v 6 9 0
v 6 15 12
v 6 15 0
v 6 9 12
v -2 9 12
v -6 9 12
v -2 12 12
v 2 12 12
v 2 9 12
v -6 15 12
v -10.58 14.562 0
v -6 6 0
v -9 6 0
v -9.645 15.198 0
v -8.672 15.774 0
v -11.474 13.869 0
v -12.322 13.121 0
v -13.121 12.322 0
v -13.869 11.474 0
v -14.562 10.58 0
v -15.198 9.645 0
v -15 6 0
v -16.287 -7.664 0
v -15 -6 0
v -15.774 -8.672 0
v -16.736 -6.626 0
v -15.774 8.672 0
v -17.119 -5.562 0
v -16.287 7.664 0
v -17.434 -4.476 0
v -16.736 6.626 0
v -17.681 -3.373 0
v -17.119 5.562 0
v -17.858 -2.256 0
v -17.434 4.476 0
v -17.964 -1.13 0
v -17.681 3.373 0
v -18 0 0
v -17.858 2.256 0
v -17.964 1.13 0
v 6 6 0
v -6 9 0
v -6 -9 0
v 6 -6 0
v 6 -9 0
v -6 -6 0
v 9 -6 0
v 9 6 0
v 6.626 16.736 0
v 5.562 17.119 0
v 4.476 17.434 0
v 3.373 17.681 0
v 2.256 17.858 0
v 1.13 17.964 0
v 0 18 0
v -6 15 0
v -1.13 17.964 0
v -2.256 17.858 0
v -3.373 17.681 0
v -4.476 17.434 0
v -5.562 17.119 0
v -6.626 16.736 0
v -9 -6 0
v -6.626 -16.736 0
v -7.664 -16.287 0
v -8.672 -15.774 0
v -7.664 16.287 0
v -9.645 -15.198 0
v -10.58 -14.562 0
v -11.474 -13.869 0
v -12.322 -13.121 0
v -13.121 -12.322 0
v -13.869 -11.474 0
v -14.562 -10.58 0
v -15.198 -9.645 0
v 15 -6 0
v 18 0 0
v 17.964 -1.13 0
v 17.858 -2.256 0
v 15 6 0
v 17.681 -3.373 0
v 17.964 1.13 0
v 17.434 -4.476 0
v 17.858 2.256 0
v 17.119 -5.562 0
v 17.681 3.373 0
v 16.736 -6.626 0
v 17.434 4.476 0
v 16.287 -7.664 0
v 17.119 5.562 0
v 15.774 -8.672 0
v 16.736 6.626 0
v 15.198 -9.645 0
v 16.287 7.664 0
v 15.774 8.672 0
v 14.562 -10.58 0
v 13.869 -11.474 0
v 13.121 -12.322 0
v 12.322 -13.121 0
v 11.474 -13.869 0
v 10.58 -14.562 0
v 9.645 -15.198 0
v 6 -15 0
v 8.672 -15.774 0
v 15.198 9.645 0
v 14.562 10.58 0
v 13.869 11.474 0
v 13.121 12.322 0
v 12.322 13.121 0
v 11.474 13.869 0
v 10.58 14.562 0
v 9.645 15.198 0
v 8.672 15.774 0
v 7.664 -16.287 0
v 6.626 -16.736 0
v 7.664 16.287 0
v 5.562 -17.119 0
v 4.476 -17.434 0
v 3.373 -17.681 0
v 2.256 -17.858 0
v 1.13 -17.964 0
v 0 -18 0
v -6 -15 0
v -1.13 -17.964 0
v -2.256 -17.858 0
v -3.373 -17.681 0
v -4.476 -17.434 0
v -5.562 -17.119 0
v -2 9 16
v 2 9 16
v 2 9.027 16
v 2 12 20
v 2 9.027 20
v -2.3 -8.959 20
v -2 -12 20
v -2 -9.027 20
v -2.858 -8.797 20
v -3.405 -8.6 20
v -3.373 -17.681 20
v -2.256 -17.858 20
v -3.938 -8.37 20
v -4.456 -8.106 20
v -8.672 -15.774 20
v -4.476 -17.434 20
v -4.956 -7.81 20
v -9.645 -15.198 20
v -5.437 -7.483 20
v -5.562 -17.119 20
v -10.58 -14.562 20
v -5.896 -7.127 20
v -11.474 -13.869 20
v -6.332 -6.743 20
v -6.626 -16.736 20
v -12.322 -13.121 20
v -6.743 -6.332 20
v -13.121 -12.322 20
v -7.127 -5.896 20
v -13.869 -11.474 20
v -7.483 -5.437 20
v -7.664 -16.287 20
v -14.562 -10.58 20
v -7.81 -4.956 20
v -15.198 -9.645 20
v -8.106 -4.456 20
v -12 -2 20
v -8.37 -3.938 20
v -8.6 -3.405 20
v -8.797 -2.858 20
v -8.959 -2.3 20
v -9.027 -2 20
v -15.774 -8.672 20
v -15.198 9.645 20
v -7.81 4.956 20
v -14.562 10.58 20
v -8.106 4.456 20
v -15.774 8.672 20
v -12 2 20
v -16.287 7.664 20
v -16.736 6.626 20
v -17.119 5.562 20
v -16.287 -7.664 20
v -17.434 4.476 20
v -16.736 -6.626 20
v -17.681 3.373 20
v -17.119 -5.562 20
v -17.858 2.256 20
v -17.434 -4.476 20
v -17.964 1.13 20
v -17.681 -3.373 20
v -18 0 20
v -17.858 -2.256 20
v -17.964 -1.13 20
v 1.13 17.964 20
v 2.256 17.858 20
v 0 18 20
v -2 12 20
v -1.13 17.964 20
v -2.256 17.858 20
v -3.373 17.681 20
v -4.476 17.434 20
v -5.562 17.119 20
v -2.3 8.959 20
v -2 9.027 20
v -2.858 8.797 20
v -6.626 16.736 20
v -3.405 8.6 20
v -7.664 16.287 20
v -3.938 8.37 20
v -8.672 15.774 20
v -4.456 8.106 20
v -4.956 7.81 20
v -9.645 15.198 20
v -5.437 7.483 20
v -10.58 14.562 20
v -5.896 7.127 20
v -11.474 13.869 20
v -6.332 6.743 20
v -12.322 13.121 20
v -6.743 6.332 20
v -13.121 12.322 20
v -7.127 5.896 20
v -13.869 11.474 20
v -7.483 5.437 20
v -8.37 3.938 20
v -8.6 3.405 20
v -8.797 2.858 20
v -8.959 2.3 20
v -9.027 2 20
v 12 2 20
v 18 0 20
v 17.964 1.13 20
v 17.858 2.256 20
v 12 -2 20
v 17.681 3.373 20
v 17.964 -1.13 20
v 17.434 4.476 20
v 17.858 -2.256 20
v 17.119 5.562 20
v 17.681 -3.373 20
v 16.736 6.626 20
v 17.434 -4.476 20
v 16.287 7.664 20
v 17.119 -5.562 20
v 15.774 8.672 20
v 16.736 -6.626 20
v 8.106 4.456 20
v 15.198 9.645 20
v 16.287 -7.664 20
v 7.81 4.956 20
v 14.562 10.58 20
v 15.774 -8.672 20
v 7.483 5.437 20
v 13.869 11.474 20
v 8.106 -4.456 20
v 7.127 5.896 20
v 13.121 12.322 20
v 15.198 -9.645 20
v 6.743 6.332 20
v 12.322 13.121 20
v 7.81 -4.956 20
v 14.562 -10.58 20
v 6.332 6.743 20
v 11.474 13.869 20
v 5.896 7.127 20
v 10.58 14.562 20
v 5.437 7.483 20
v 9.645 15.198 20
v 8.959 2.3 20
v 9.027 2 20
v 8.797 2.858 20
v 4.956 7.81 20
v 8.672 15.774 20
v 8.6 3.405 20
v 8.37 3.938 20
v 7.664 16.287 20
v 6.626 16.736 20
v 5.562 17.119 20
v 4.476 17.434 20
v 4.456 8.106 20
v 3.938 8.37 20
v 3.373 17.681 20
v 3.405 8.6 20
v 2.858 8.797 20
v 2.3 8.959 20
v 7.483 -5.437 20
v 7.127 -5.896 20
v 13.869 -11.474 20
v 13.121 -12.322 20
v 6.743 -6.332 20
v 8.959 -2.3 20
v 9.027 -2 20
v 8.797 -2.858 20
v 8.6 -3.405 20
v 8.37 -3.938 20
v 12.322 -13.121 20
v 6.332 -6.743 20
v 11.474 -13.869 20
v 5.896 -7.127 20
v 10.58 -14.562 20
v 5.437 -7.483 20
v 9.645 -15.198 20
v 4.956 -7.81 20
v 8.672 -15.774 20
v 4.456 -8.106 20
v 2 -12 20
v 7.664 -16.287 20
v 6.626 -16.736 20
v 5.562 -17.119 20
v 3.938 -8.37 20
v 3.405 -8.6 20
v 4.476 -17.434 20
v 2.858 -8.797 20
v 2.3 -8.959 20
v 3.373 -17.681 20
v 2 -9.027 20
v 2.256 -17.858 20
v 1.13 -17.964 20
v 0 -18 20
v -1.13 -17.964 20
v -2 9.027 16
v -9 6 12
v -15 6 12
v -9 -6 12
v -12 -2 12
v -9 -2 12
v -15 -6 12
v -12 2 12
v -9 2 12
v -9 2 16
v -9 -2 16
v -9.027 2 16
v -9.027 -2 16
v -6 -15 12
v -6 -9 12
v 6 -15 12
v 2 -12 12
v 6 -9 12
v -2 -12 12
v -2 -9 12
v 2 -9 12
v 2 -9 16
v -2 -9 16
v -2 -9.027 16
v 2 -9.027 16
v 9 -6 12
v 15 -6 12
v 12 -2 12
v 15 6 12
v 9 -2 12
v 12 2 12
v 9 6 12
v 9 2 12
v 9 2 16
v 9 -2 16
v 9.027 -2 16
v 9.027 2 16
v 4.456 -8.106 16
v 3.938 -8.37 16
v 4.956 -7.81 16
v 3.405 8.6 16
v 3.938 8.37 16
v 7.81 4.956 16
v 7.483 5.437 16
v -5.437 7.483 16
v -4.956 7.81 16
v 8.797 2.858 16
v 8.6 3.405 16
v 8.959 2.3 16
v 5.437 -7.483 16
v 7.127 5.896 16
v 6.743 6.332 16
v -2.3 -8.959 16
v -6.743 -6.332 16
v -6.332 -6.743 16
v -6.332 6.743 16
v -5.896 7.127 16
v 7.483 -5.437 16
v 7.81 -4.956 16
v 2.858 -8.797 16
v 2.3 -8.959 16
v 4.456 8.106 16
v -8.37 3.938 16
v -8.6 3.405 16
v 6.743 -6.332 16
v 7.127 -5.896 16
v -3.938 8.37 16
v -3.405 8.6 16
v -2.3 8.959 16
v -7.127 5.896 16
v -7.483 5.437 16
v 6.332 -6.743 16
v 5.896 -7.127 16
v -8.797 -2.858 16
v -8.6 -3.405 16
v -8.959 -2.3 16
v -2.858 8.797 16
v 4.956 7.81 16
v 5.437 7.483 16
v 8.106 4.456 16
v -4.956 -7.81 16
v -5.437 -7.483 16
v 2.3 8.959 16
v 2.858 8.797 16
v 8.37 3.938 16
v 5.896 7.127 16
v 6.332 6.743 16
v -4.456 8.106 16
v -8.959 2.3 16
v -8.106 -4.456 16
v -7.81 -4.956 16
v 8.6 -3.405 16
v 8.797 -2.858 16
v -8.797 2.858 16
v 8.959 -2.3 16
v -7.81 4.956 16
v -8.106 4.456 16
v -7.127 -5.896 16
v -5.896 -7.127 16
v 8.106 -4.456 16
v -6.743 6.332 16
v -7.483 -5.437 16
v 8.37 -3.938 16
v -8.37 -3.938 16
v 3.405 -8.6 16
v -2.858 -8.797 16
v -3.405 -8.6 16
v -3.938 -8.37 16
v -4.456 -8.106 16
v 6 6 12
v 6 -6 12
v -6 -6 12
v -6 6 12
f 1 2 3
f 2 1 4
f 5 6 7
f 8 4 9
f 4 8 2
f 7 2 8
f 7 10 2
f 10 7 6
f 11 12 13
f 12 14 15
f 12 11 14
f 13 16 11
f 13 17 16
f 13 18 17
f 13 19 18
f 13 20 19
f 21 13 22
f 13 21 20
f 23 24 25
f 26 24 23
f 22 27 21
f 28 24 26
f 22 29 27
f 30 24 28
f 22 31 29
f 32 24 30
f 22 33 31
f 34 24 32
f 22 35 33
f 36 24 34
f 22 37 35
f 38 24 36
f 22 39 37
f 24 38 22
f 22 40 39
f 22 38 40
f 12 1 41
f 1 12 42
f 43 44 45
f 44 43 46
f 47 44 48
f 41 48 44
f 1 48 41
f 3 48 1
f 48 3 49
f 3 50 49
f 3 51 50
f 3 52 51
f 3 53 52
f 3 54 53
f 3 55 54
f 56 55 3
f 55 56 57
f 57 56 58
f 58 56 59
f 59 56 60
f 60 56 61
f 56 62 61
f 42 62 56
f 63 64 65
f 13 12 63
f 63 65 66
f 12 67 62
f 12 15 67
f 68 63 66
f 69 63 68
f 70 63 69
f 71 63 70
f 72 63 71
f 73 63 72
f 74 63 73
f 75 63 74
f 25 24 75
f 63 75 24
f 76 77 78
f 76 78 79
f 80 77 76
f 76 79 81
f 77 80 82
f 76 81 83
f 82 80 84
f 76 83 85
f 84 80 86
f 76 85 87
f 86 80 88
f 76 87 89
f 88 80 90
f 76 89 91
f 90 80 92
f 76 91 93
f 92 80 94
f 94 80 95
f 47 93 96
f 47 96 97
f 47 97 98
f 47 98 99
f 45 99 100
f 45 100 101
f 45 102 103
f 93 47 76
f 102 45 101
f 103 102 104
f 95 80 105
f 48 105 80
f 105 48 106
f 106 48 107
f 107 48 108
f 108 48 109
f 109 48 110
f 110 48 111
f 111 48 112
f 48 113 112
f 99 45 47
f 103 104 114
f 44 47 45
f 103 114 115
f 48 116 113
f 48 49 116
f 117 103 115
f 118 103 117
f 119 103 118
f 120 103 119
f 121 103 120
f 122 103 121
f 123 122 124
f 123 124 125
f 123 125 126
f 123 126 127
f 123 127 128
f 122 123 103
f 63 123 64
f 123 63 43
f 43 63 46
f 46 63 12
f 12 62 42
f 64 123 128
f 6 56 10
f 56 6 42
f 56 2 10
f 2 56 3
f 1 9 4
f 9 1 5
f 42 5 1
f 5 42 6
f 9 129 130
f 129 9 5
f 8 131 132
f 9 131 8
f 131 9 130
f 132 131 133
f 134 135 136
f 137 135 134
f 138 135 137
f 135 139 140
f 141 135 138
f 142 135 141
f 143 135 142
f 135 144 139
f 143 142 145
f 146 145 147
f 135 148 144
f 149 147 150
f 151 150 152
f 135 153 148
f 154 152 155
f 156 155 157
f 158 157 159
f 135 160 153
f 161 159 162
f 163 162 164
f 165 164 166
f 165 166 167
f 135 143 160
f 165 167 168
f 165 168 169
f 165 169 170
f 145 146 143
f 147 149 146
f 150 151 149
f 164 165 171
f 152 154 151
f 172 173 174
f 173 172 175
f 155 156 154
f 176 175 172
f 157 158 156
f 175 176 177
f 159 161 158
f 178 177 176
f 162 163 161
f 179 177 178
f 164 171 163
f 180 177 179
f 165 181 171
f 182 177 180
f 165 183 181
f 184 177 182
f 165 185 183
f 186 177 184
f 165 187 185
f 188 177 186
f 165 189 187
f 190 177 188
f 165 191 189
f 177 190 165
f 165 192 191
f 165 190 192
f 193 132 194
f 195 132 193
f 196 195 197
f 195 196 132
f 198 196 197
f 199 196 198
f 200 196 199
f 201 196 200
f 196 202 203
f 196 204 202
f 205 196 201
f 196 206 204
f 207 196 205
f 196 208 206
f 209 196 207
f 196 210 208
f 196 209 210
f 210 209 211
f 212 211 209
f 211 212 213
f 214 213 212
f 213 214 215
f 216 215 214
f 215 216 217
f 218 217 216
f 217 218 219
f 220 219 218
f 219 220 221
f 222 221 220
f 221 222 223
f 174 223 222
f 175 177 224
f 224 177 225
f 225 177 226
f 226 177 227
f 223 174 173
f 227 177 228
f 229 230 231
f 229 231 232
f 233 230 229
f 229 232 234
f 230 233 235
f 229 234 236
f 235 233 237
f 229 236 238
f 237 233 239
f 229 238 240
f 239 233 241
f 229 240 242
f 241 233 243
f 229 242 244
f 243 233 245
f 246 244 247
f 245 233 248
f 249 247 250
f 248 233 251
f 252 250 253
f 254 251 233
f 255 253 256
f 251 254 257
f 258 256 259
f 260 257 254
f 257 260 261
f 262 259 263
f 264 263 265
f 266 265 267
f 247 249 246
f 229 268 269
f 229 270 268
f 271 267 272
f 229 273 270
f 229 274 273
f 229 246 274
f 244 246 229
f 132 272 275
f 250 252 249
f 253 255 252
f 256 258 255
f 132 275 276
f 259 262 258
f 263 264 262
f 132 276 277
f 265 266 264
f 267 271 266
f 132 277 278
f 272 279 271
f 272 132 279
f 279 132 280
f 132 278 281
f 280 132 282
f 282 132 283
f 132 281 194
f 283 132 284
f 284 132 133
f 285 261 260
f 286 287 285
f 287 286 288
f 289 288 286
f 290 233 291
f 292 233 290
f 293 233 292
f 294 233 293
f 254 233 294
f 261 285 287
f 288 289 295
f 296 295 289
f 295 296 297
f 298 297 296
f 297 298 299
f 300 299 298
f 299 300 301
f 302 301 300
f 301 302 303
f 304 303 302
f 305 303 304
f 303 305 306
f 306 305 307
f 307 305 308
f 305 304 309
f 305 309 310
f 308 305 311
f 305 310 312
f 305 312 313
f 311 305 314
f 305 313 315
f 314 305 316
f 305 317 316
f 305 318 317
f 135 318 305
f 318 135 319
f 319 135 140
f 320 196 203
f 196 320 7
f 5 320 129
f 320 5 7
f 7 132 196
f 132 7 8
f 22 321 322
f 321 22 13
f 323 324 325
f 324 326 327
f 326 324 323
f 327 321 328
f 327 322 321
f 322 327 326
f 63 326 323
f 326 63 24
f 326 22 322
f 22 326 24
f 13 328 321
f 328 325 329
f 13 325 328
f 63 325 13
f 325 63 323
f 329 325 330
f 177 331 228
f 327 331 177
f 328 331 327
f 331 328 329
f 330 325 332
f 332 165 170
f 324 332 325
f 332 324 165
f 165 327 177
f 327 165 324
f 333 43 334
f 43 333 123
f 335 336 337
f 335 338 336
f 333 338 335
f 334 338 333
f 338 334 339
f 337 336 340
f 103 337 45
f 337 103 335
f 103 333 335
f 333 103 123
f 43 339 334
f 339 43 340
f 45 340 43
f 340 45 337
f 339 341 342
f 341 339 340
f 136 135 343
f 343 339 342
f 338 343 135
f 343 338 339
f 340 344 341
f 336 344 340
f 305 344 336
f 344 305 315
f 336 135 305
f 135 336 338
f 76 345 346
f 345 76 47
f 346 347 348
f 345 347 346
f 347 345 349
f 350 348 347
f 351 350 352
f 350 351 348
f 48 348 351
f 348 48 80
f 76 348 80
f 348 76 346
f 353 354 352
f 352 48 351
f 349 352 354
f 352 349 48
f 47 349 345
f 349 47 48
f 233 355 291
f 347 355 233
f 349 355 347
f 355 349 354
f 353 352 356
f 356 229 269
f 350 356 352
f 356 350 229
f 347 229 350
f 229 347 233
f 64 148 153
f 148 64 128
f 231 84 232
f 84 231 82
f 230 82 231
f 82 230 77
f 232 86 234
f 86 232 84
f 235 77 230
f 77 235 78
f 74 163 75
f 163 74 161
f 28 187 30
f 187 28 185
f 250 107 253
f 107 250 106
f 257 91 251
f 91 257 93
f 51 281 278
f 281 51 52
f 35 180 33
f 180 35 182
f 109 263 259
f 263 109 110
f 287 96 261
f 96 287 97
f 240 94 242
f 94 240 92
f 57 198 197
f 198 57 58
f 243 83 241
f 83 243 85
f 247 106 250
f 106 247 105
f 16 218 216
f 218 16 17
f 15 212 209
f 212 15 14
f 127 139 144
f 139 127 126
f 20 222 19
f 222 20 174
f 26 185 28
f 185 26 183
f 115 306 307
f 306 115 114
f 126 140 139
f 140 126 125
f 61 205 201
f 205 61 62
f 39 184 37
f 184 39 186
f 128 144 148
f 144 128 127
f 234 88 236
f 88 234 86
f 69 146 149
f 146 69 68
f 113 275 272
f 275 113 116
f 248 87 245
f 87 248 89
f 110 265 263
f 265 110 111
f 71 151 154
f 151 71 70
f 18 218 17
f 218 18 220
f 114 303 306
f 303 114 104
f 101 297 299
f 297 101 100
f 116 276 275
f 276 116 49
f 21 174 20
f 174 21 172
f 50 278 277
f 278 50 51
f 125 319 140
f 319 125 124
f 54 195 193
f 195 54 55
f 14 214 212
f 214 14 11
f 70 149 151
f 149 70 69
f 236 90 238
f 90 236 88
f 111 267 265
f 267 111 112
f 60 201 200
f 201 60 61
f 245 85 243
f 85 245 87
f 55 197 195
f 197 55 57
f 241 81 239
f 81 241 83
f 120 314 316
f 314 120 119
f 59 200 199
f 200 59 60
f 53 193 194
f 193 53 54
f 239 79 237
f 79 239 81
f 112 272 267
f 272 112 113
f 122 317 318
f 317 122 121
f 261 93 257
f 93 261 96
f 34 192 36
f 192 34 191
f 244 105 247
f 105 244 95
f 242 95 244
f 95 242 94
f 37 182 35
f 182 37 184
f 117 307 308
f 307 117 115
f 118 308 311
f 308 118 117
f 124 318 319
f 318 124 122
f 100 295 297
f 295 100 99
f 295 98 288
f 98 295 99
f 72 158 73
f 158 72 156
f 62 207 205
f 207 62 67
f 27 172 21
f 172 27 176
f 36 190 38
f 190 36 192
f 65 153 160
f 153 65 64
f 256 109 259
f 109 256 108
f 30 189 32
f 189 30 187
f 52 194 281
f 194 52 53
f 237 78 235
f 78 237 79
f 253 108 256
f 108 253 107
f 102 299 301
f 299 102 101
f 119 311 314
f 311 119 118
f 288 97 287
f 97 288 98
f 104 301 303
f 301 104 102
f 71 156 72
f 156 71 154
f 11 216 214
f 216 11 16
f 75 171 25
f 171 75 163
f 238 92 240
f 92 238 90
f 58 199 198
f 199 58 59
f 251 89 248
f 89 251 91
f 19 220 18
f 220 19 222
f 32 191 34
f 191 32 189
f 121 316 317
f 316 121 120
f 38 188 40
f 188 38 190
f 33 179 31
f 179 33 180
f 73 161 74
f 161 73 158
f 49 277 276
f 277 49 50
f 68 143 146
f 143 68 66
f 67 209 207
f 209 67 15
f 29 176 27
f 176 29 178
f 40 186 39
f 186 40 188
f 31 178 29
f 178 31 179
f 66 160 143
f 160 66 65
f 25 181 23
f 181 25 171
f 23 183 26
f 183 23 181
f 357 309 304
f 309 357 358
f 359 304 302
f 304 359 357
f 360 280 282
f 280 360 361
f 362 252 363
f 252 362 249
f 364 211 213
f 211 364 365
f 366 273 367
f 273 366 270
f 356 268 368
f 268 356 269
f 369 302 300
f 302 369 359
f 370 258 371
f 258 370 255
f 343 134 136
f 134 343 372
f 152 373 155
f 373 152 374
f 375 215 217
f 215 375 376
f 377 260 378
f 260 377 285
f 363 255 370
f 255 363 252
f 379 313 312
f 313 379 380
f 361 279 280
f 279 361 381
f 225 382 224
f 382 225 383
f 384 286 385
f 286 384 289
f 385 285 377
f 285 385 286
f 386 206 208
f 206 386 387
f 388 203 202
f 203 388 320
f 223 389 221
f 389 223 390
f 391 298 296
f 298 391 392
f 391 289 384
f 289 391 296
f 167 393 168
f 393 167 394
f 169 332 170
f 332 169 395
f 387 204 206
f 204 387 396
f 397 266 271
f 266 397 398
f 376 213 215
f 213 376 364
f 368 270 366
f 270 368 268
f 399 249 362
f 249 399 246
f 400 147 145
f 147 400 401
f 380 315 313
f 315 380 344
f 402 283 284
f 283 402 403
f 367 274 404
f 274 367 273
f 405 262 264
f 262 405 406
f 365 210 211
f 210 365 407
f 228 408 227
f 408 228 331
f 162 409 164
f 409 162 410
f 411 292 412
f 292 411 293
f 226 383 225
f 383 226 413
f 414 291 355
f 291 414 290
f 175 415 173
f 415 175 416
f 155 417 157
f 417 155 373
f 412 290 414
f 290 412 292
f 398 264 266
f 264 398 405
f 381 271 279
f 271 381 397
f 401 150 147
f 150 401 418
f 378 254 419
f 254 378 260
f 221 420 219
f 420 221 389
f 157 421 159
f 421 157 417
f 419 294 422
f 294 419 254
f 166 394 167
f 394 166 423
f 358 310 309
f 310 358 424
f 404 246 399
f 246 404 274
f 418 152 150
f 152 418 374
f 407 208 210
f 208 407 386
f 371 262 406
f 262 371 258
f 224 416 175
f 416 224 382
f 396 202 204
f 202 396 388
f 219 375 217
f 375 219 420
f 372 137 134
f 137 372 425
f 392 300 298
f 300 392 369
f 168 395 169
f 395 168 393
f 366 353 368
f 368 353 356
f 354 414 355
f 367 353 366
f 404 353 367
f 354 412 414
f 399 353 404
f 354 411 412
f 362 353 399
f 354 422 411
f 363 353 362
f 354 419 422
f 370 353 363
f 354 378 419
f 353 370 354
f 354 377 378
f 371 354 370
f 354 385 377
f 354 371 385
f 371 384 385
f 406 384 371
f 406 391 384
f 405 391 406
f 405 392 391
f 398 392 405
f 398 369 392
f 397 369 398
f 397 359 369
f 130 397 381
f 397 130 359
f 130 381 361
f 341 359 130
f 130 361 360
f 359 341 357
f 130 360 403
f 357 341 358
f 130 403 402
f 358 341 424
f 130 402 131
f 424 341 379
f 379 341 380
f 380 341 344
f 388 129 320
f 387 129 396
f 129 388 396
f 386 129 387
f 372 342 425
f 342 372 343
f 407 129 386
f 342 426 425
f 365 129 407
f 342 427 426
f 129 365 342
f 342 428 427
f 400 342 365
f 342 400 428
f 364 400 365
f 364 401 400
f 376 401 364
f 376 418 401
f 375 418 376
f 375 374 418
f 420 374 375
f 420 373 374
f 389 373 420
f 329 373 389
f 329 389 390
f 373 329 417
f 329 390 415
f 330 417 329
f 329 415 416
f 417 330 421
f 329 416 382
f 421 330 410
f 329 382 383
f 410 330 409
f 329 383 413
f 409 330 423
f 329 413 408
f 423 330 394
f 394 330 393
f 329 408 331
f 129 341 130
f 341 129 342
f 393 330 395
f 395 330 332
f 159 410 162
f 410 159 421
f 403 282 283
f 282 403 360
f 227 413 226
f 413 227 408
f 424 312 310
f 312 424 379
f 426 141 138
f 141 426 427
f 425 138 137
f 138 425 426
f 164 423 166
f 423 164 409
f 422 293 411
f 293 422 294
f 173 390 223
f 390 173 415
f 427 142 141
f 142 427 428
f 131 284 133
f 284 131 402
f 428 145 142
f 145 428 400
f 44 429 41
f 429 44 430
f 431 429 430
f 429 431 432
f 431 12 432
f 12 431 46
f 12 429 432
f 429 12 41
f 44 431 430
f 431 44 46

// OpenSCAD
$fn = 100;


module sensor_place() {
  translate([-6, 0, 0]) {
    cube([12, 6, 12]);
    translate([4, 0, 12]) cube([4, 3, 8]);
  }
}


//color("lightblue") cylinder(h=20, d=20);
difference() {
  cylinder(h=20, d=36);

  translate([0, 0, 16]) cylinder(h=4, d=18.5);
  
  translate([-6, -6, 0]) cube([12, 12, 12]);

  translate([0, 9, 0]) sensor_place();
  rotate([0, 0, 90]) translate([0, 9, 0]) sensor_place();
  rotate([0, 0, 180]) translate([0, 9, 0]) sensor_place();
  rotate([0, 0, 270]) translate([0, 9, 0]) sensor_place();
}
